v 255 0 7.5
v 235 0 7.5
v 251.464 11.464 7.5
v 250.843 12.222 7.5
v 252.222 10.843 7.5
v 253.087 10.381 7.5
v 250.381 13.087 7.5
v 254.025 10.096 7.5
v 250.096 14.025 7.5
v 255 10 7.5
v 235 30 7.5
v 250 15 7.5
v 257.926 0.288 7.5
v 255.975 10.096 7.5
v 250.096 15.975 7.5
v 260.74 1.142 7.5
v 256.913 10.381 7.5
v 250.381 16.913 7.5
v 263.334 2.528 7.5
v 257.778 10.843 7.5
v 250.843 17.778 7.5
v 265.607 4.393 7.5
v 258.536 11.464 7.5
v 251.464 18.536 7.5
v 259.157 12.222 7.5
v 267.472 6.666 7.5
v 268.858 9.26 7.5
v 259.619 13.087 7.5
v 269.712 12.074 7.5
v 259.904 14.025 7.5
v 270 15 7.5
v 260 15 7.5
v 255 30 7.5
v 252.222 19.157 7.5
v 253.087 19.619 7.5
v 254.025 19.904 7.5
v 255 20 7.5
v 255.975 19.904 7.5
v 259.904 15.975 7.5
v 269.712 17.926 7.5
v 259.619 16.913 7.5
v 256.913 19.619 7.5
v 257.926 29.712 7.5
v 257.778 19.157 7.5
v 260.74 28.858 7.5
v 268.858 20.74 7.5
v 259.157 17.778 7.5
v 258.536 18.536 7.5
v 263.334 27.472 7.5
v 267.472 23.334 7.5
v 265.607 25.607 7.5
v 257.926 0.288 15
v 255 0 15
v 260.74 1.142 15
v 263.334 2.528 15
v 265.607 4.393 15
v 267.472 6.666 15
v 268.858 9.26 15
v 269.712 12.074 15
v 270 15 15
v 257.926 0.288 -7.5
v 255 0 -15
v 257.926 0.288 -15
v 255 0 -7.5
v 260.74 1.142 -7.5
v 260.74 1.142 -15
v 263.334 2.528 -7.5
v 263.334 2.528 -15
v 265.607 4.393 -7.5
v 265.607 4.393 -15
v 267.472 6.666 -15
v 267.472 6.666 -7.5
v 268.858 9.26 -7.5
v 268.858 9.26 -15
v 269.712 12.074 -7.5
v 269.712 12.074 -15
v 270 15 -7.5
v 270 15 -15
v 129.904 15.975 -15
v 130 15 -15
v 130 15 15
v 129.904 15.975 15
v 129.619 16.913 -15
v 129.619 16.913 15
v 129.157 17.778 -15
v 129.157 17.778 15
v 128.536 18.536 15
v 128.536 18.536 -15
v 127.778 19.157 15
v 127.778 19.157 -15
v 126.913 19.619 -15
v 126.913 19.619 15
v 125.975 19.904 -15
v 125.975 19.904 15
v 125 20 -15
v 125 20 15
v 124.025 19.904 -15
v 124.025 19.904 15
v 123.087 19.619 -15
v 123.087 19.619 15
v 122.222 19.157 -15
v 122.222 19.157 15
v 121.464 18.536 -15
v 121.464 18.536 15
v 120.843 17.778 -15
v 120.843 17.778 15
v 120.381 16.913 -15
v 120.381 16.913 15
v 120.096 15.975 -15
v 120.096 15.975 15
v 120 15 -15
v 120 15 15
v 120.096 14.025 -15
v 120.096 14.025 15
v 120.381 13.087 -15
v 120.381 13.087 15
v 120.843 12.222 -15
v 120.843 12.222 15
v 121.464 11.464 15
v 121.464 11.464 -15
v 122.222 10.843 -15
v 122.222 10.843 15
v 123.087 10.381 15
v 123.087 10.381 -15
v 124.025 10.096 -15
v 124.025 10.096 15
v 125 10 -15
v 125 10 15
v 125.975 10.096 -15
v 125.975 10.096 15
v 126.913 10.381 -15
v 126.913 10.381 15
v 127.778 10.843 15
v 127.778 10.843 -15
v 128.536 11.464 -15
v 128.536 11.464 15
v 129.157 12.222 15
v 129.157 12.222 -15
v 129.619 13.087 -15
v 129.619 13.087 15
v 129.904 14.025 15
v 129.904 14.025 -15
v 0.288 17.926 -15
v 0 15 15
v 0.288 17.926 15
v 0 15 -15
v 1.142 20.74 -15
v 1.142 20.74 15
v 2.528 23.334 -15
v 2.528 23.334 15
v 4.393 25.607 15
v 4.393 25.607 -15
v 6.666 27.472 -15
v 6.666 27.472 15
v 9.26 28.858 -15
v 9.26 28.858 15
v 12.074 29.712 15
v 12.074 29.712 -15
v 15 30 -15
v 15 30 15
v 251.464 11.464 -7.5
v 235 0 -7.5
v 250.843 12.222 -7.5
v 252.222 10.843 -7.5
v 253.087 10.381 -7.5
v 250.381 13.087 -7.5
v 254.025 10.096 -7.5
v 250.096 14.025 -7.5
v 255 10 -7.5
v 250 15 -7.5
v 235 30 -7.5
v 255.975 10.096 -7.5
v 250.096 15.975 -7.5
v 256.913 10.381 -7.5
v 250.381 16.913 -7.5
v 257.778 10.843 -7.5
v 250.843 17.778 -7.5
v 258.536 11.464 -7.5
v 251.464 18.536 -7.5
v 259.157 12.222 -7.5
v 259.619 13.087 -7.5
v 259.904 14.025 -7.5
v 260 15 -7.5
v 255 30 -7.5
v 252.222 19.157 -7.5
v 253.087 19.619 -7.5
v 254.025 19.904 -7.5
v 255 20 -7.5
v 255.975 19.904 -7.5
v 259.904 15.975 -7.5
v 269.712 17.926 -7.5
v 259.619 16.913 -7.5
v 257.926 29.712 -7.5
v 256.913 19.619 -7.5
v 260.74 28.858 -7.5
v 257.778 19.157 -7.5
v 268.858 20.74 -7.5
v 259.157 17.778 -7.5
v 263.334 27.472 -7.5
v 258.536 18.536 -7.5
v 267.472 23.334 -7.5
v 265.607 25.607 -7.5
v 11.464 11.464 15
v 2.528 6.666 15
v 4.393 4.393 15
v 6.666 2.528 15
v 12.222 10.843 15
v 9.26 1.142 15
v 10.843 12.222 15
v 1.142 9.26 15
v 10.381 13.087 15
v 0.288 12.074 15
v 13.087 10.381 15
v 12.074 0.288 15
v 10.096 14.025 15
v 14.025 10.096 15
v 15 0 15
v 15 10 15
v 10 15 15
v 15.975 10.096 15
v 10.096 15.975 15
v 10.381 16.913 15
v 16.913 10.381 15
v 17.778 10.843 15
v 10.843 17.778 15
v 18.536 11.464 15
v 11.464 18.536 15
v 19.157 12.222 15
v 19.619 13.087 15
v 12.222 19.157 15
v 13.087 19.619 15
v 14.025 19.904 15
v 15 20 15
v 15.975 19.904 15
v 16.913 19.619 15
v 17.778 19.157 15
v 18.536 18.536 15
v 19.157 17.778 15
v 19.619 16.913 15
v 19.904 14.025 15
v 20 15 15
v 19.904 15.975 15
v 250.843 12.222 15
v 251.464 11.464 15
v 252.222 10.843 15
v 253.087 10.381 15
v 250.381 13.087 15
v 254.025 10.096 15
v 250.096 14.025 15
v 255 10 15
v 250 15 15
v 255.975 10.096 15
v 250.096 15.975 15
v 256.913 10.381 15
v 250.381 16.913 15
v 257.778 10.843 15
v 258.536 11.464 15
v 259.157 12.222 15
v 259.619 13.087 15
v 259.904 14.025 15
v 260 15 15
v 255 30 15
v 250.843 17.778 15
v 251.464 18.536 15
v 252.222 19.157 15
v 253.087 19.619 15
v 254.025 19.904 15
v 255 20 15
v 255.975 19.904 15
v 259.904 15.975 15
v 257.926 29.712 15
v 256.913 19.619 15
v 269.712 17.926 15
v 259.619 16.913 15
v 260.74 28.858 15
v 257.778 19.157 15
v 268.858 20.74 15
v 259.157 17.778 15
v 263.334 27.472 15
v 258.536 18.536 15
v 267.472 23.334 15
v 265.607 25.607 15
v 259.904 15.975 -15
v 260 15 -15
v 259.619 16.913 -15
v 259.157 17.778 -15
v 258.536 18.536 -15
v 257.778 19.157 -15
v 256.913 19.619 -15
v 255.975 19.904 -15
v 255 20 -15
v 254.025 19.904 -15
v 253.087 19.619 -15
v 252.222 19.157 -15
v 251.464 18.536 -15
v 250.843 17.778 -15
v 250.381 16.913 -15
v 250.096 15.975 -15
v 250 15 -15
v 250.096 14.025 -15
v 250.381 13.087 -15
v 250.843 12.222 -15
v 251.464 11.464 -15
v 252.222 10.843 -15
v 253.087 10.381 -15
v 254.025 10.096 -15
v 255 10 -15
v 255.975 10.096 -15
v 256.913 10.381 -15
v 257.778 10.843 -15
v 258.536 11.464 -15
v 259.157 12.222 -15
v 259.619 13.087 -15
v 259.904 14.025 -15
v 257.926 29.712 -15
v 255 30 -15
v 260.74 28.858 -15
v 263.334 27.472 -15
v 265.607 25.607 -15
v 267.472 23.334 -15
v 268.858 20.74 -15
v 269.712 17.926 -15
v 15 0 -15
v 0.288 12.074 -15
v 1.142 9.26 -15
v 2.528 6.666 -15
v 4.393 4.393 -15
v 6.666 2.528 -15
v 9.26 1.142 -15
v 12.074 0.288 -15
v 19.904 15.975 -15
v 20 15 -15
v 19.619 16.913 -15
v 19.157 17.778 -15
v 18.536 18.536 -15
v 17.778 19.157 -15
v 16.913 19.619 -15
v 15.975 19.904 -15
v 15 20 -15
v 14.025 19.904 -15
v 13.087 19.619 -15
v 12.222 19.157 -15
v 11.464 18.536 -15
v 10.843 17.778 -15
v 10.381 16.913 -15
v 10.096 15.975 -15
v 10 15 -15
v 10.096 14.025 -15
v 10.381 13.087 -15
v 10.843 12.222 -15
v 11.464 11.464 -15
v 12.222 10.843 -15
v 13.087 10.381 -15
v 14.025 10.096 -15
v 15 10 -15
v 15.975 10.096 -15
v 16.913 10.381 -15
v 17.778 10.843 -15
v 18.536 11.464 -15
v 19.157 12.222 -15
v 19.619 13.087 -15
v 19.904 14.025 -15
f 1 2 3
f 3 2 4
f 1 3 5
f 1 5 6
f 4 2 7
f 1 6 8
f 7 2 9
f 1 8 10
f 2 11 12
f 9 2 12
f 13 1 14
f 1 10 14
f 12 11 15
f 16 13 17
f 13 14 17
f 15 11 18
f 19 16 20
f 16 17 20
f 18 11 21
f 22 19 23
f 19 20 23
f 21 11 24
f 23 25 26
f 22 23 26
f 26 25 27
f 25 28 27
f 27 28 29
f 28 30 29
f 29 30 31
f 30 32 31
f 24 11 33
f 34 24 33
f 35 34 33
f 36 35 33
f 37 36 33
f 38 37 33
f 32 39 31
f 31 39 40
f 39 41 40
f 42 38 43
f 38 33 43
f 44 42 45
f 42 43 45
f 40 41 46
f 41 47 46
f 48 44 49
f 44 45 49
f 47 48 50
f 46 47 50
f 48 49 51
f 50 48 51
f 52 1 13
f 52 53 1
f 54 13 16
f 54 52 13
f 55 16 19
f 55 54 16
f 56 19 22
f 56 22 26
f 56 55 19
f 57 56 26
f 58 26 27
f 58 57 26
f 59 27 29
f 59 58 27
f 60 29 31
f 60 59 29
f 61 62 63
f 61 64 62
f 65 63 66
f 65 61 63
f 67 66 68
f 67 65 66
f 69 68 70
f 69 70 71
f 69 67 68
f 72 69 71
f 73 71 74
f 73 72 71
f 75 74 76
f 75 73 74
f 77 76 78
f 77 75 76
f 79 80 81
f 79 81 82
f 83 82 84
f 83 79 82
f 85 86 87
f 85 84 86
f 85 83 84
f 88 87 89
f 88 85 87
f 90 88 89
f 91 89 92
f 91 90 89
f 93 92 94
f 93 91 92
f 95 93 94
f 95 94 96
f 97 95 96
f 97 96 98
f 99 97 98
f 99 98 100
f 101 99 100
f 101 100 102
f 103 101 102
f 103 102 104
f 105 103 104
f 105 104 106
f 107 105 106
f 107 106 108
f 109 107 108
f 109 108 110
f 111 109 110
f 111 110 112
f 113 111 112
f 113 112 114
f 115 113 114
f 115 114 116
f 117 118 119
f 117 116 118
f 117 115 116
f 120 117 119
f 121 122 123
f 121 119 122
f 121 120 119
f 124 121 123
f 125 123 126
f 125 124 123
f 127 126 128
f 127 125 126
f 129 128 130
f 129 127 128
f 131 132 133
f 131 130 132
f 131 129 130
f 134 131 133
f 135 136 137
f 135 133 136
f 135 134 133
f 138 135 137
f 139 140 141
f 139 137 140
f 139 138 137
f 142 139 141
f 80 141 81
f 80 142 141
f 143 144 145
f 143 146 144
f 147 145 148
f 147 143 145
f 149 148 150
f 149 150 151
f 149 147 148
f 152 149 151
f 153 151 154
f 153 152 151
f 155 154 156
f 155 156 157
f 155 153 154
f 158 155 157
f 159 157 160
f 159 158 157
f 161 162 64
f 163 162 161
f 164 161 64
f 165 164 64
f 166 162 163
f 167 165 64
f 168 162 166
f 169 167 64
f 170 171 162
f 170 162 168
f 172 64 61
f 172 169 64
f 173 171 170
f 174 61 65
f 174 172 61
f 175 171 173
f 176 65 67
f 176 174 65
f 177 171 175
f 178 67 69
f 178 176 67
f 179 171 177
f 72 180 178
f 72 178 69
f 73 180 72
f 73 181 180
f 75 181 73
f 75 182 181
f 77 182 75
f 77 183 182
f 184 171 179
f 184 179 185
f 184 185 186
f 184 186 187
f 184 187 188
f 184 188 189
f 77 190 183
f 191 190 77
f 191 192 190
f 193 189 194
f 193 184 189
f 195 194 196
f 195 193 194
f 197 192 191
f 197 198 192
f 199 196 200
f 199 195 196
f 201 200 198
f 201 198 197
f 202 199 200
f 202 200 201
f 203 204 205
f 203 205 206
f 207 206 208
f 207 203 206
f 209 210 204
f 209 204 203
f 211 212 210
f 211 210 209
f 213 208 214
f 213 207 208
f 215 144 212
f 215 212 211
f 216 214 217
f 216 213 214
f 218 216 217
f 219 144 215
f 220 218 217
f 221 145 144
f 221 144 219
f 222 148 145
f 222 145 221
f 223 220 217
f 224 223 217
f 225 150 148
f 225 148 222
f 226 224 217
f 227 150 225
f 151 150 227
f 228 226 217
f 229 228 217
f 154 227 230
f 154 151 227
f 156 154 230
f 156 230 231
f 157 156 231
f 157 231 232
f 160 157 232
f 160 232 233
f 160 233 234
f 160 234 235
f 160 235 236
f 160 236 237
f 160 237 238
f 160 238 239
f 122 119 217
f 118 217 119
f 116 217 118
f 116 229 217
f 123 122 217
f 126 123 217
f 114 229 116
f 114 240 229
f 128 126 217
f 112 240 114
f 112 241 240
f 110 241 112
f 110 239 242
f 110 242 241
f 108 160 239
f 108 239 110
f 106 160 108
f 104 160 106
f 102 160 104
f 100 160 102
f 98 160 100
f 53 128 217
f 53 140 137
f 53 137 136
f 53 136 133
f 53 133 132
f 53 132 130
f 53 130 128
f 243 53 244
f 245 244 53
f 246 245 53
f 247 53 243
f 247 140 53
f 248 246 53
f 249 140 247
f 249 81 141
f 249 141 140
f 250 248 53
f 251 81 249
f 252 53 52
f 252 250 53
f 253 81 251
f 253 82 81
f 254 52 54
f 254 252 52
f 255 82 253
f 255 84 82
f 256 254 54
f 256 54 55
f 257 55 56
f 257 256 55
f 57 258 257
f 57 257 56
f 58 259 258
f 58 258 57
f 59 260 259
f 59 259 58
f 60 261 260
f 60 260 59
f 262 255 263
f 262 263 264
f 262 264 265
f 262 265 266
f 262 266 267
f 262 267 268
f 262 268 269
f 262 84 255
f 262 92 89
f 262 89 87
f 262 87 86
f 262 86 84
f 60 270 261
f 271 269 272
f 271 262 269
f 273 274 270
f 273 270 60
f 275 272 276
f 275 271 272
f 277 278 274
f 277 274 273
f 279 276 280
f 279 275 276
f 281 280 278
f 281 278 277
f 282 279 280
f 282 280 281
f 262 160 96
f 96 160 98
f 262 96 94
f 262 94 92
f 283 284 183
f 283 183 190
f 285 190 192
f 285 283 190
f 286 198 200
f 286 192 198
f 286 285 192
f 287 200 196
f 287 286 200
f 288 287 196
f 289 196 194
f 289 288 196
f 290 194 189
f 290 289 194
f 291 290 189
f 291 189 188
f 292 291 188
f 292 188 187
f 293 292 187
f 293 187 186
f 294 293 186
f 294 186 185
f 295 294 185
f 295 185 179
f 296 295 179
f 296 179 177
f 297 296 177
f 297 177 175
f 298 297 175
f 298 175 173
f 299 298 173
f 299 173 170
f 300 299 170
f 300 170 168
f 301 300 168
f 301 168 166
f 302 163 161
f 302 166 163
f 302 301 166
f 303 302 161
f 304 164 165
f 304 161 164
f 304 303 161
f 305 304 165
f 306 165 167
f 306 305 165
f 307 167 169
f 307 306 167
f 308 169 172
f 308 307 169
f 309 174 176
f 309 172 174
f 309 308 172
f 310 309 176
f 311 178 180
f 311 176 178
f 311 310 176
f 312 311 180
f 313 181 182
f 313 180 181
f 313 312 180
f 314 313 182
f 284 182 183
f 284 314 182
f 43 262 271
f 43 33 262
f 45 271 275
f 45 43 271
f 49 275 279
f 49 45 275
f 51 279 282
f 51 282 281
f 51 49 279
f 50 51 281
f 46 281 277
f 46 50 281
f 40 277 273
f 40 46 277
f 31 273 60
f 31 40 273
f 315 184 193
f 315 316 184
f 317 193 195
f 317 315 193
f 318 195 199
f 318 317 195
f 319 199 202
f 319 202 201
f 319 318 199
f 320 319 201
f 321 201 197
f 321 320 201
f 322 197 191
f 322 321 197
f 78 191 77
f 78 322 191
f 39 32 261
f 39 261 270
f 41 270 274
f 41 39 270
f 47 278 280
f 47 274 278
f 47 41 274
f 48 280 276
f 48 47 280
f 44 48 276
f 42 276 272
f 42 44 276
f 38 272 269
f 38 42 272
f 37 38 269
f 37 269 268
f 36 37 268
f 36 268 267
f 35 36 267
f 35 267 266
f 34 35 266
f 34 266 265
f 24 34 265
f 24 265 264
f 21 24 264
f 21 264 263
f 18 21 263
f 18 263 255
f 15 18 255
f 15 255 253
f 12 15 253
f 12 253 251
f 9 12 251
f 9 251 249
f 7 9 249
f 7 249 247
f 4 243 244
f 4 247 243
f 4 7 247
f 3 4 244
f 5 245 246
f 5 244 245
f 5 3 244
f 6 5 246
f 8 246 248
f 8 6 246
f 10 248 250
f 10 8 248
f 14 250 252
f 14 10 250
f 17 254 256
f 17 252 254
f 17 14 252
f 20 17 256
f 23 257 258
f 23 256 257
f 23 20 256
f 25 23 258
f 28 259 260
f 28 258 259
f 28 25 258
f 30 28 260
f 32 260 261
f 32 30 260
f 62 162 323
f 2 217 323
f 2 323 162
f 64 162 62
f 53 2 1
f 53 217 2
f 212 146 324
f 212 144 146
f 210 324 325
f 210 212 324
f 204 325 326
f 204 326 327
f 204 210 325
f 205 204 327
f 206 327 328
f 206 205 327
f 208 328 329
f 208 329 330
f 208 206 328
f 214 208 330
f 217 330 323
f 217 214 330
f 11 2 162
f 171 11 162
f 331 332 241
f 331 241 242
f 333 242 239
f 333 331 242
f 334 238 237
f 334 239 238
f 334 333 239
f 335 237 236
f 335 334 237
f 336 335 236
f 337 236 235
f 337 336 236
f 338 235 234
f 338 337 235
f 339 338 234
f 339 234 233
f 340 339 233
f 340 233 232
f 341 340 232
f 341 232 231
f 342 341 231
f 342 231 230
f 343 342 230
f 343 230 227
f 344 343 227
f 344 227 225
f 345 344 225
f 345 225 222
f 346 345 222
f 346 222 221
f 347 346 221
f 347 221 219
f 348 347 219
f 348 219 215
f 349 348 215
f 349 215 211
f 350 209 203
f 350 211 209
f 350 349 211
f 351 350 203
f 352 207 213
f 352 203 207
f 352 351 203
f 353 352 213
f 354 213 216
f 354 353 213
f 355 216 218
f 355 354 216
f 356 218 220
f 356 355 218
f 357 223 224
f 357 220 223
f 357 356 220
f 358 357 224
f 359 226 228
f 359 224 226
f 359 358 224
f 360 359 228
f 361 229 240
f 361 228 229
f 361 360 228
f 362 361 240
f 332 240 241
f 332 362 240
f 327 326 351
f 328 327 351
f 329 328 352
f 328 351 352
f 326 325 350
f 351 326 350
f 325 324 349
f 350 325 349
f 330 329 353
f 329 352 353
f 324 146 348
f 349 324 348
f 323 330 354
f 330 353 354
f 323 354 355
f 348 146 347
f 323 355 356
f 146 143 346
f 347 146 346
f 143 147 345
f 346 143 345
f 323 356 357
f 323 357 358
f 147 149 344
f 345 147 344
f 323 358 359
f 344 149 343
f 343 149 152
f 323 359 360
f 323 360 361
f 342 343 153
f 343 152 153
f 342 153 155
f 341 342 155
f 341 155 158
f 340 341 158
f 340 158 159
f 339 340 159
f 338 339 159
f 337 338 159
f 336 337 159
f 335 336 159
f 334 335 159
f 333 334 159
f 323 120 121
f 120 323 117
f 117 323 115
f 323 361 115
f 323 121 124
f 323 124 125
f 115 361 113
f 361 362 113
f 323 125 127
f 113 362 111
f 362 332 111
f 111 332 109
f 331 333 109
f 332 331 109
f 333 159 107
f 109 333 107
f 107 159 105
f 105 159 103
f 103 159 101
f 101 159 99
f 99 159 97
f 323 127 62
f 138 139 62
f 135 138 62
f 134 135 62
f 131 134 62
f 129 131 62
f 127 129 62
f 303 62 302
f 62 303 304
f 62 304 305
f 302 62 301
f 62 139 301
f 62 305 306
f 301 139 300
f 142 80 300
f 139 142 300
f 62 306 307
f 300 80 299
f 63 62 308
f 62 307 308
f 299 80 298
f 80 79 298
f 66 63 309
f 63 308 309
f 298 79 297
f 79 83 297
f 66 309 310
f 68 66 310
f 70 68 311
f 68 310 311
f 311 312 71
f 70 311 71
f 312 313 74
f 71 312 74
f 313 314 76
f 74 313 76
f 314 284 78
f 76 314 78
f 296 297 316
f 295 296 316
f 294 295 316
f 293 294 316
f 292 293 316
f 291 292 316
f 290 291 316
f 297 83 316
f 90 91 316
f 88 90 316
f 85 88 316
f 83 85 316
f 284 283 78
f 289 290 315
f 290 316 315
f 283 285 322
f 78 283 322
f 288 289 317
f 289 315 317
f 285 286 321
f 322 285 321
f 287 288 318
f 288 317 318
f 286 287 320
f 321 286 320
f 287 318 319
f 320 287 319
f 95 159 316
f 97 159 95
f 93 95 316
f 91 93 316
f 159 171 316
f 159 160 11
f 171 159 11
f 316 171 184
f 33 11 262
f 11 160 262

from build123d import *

# Parameters (mm, degrees)
SKETCH1_W               = 270
SKETCH1_H               = 30
BOSS_EXTRUDE1_DEPTH     = 15
CUT_EXTRUDE1_REACH      = 274.075
SKETCH2_W               = 35
SKETCH2_H               = 15
CUT_EXTRUDE2_DEPTH      = 274.313007374
CUT_EXTRUDE2_DEPTH_BACK = 274.313007374
SKETCH3_R               = 5
FILLET3_R               = 15


with BuildPart() as part:
    # Sketch1 → Boss-Extrude1 (new, symmetric)
    with BuildSketch(Plane.XY):
        with Locations((135, 15)):
            Rectangle(SKETCH1_W, SKETCH1_H)
    extrude(amount=BOSS_EXTRUDE1_DEPTH, both=True)

    # Sketch2 → Cut-Extrude1 (cut, up to next)
    with BuildSketch(Plane(origin=(0, 30, 0), x_dir=(1, 0, 0), z_dir=(0, 1, 0)), mode=Mode.PRIVATE) as cut_extrude1_sk1:
        with Locations((252.5, 0)):
            Rectangle(SKETCH2_W, SKETCH2_H)
    cut_extrude1_tool1 = extrude(cut_extrude1_sk1.sketch, amount=-CUT_EXTRUDE1_REACH, mode=Mode.PRIVATE) & part.part
    add(cut_extrude1_tool1.solids().sort_by_distance((252.5, 30, 0))[0], mode=Mode.SUBTRACT)

    # Sketch3 → Cut-Extrude2 (cut, two sides: drawn at the far end of the back side and taken through both)
    with BuildSketch(Plane.XY.offset(15).offset(-CUT_EXTRUDE2_DEPTH_BACK)):
        with Locations((15, 15)):
            Circle(SKETCH3_R)
        with Locations((255, 15)):
            Circle(SKETCH3_R)
        with Locations((125, 15)):
            Circle(SKETCH3_R)
    extrude(amount=CUT_EXTRUDE2_DEPTH + CUT_EXTRUDE2_DEPTH_BACK, mode=Mode.SUBTRACT)

    # Fillet3
    fillet3_edges = [part.edges().sort_by_distance(p)[0] for p in [
        (270, 0, -11.25),
        (270, 30, -11.25),
        (270, 0, 11.25),
        (270, 30, 11.25),
        (0, 0, 0),
        (0, 30, 0),
    ]]
    fillet(fillet3_edges, radius=FILLET3_R - 0.0001)  # a hair under: the kernel refuses the full size


solid = part.part
